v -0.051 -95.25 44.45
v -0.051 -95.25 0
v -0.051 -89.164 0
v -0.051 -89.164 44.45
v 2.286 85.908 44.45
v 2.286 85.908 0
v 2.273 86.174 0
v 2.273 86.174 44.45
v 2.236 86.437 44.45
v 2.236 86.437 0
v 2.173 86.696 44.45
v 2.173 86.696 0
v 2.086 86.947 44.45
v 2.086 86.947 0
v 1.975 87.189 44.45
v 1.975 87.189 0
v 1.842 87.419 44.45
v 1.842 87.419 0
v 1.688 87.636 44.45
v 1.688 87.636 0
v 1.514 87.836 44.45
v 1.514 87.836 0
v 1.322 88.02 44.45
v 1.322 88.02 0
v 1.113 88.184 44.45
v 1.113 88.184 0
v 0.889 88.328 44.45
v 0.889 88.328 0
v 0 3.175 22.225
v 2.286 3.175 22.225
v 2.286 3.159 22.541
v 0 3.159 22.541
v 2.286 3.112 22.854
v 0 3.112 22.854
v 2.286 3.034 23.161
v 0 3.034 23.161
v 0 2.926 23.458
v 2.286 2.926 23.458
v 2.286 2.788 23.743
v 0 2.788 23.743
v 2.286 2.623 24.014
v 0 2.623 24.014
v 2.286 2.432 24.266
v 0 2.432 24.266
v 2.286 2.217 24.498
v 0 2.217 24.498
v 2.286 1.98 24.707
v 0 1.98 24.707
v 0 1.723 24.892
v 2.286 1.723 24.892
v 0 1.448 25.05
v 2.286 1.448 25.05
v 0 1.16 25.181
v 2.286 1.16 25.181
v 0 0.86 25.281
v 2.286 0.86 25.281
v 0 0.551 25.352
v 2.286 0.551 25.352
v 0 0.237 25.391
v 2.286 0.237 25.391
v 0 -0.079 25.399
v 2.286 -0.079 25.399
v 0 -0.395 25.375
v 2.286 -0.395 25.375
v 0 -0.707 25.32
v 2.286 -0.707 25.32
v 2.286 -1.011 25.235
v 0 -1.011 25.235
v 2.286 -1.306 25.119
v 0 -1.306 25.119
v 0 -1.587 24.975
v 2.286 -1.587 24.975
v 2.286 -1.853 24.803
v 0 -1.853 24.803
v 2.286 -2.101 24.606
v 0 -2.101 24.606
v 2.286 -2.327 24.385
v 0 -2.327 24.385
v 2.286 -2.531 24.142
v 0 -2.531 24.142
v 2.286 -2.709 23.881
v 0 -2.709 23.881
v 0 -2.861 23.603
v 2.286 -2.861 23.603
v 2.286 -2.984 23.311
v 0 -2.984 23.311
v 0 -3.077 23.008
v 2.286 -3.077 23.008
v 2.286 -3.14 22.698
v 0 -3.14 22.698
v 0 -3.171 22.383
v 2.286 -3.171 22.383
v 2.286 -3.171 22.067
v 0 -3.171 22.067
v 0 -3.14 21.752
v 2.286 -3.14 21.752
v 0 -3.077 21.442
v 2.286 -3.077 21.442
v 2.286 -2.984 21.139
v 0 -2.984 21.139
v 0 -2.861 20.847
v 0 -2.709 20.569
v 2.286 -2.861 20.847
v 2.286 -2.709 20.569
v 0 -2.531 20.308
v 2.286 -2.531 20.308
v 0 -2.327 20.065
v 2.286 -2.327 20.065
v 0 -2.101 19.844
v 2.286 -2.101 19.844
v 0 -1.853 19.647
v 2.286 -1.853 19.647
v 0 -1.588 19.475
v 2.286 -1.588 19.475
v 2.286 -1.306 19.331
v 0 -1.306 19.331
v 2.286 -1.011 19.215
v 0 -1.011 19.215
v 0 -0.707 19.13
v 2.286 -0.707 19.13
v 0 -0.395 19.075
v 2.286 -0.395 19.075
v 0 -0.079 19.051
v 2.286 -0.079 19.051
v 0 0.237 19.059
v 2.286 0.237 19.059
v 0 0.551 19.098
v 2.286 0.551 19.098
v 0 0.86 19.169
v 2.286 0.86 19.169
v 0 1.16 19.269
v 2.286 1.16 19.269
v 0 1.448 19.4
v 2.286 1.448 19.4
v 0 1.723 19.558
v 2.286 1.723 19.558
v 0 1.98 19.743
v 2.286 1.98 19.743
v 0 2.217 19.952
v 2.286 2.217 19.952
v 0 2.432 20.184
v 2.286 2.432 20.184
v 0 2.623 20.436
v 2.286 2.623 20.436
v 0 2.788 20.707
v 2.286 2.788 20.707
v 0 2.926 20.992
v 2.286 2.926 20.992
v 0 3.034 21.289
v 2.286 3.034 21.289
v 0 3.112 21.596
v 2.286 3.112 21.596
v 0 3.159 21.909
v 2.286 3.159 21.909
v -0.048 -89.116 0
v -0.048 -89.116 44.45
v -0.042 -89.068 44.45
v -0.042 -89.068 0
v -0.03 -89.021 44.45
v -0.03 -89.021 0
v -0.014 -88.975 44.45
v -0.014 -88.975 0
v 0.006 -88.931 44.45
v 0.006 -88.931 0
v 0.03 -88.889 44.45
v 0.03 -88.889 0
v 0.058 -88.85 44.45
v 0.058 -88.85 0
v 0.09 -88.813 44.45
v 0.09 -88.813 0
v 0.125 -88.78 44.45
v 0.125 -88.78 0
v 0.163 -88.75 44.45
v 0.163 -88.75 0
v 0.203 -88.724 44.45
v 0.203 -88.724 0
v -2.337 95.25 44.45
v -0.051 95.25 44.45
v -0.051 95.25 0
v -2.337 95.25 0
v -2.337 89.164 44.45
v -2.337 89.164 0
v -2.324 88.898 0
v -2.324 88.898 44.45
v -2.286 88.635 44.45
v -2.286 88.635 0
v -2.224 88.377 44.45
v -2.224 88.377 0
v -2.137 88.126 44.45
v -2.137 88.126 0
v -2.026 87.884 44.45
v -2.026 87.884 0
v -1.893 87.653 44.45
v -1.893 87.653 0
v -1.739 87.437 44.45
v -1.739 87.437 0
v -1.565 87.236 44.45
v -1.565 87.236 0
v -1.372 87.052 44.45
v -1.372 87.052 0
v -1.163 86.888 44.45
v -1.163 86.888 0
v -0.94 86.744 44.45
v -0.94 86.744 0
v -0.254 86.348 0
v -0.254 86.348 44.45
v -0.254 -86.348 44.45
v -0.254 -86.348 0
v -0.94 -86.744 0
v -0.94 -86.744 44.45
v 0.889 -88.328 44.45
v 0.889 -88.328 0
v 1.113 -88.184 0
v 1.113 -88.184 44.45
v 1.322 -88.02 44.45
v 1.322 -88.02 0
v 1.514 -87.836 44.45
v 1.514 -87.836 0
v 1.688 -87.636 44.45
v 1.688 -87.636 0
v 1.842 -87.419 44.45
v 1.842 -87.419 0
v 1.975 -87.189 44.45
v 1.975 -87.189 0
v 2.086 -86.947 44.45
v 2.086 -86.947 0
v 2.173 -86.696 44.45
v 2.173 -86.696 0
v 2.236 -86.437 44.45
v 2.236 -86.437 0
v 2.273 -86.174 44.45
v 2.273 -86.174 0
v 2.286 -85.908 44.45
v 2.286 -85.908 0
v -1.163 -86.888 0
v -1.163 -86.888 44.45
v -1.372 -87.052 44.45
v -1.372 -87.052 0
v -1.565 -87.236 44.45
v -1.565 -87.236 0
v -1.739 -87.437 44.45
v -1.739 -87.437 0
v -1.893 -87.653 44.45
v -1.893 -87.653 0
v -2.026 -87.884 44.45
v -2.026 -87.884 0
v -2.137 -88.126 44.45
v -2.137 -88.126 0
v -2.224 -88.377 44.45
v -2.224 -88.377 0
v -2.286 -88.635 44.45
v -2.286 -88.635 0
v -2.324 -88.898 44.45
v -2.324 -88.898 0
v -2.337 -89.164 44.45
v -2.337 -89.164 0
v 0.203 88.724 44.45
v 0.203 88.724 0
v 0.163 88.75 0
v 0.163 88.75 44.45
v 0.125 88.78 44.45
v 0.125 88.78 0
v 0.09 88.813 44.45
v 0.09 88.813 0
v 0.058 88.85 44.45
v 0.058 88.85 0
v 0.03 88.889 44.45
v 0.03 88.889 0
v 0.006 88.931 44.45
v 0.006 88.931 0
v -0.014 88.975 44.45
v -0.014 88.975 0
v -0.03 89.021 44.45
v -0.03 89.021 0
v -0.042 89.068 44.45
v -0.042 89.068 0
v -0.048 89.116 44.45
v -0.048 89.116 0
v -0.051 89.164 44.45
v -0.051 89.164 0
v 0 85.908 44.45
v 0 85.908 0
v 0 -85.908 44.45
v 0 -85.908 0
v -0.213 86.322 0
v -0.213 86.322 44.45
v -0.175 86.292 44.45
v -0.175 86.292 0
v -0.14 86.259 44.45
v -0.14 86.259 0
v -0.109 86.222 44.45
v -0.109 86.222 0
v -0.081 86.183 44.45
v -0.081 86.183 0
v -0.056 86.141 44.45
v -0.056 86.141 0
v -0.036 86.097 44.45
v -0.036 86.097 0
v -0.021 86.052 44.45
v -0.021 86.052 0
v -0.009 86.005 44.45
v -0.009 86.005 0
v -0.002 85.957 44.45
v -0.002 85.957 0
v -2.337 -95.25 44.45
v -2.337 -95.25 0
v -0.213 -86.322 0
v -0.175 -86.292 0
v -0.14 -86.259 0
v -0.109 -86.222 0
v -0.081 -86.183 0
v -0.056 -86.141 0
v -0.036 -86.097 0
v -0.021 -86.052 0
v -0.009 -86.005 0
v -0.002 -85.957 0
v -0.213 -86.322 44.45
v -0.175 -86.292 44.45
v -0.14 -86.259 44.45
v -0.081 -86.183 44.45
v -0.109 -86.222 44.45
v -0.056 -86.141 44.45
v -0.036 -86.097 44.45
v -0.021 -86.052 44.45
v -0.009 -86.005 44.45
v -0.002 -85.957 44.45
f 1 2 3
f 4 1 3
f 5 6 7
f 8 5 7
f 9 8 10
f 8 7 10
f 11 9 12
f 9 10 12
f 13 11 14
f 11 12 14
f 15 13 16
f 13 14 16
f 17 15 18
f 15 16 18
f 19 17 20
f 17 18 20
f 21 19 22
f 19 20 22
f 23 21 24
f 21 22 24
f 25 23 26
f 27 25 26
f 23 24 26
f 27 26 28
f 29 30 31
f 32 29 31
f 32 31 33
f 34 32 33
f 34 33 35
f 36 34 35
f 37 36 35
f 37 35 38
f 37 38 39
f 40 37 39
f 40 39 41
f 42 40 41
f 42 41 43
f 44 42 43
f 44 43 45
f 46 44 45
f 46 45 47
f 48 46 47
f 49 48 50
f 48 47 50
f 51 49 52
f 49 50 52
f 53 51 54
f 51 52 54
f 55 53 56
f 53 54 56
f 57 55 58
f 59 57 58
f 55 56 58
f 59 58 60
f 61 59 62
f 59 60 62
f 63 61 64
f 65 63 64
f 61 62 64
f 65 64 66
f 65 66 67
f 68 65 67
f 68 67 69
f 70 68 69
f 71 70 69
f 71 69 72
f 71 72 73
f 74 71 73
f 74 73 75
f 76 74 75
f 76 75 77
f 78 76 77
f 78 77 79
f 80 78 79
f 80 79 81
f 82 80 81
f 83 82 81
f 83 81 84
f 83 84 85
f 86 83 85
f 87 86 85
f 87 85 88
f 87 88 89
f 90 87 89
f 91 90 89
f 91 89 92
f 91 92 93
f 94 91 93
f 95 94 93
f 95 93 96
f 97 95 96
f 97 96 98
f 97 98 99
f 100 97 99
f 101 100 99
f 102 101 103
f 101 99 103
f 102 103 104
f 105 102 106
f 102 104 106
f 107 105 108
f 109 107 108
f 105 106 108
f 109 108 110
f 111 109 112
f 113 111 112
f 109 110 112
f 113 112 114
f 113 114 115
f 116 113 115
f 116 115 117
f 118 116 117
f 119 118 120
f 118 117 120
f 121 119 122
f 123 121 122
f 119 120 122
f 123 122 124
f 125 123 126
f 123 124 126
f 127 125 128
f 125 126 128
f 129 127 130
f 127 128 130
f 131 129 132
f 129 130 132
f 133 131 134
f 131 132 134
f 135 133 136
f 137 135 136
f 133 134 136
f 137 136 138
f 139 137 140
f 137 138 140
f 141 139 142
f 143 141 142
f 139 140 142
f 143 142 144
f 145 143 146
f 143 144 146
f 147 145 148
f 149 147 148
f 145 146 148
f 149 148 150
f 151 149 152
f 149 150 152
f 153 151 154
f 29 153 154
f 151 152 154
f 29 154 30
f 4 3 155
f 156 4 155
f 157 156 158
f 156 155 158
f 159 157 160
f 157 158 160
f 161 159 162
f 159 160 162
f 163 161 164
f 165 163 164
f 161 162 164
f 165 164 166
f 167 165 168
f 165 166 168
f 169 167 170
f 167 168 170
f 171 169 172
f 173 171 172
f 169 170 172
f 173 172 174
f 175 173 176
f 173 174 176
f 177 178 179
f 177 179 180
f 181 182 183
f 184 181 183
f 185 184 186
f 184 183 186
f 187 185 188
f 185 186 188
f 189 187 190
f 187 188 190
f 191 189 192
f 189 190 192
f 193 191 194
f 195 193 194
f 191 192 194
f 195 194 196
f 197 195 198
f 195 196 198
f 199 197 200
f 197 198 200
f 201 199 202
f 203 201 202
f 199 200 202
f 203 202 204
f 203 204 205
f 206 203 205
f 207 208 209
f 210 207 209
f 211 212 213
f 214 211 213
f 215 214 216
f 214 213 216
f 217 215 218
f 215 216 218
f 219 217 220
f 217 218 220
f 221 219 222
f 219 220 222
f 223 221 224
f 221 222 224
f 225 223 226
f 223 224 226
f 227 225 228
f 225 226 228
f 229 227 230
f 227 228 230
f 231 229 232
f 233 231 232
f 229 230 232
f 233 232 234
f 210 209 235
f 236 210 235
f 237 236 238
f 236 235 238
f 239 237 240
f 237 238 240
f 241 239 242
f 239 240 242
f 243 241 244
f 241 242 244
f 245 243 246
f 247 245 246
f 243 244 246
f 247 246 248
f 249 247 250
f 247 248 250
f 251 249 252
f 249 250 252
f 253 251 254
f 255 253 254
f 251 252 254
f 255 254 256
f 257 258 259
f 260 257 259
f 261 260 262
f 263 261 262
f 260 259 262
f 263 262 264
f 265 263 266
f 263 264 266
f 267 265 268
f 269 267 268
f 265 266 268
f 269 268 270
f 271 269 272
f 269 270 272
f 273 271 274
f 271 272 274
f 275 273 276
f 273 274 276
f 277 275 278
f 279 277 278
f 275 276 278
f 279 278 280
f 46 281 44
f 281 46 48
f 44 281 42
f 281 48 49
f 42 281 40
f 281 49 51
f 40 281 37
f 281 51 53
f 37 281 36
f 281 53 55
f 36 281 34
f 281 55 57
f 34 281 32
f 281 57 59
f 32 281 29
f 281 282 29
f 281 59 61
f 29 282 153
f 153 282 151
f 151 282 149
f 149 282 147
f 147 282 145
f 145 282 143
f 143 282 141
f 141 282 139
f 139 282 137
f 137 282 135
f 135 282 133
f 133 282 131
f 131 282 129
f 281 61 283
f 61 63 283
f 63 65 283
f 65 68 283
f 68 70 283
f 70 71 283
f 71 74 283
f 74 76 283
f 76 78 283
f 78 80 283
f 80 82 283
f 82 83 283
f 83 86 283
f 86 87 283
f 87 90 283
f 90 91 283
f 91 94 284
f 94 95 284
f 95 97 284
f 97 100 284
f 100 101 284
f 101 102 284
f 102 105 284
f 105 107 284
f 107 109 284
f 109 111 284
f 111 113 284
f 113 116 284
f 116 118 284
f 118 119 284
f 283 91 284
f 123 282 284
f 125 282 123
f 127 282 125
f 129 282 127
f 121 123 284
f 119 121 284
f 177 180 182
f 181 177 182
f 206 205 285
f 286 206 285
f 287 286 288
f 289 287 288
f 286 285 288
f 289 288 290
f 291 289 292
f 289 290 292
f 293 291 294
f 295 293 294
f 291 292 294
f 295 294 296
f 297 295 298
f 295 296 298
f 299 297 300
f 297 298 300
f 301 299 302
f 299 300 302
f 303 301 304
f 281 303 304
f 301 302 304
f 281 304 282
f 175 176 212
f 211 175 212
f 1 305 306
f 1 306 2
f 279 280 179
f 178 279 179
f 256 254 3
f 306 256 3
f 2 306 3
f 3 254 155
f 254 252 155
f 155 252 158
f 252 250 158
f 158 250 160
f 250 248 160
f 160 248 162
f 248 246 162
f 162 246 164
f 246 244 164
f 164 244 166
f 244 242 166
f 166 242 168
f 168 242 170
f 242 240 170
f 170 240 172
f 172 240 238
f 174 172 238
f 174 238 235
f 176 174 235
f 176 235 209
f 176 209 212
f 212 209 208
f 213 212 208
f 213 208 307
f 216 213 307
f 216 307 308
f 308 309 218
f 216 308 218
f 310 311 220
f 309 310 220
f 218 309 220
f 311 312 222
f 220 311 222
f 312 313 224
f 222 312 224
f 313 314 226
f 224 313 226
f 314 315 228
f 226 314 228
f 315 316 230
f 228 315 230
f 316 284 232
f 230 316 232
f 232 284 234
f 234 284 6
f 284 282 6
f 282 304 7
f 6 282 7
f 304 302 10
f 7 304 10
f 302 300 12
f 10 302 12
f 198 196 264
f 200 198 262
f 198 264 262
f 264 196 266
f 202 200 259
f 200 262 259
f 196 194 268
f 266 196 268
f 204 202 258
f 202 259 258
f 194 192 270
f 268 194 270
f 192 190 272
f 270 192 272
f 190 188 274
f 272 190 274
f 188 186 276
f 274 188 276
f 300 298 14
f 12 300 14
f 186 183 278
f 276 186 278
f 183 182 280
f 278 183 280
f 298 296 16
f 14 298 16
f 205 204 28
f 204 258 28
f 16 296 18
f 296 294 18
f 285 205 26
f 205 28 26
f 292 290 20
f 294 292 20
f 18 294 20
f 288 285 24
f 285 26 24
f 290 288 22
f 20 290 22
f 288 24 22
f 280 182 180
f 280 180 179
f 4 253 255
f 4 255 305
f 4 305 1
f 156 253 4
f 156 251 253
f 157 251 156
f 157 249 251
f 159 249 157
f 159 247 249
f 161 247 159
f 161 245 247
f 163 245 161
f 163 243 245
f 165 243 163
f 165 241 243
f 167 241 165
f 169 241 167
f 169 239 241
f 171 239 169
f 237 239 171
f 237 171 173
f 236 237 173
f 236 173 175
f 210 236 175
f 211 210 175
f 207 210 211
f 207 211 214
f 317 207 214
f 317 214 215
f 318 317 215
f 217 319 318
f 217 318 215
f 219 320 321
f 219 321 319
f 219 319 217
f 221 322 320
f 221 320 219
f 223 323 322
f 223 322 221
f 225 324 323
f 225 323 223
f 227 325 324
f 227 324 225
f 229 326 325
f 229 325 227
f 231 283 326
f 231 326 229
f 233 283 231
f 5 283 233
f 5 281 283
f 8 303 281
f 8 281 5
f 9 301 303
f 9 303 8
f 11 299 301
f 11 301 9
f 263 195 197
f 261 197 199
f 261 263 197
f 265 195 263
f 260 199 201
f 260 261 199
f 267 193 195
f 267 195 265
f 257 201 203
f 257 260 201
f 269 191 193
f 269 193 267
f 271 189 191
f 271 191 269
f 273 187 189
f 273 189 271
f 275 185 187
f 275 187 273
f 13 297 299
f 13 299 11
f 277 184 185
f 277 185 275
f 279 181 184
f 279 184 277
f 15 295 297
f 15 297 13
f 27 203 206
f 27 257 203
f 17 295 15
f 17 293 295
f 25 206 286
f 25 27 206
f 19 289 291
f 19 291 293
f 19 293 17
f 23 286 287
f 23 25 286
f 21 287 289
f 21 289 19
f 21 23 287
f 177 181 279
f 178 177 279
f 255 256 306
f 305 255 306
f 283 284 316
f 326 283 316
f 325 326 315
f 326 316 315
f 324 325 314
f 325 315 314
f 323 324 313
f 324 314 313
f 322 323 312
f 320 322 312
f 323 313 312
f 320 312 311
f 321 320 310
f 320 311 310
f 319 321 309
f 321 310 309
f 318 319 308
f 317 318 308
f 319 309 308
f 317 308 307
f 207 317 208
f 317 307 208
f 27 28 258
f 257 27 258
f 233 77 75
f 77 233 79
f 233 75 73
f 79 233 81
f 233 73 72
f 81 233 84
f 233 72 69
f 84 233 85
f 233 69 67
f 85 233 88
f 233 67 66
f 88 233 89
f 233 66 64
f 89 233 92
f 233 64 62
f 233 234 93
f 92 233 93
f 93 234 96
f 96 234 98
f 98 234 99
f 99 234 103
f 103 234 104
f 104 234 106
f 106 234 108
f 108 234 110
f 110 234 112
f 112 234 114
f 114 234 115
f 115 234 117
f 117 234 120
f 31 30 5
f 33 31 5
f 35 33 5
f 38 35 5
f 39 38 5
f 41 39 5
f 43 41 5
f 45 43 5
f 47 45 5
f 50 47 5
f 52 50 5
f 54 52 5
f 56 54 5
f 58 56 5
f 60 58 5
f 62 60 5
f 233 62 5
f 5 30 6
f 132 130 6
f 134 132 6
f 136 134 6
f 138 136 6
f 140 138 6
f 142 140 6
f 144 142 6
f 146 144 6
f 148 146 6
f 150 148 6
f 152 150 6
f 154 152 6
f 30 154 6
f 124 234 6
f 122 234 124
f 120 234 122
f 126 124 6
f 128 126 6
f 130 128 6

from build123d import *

# Parameters (mm, degrees)
BASE_FLANGE1_DEPTH = 44.45
CUT_EXTRUDE3_REACH = 107.213
SKETCH5_R          = 3.175


# Sheet-metal steps are written as plain solids
with BuildPart() as part:
    # Sketch1 → Base-Flange1 (new body)
    with BuildSketch(Plane.XY):
        with BuildLine():
            Line((-2.3368, 95.25), (-2.3368, 89.163964543))
            ThreePointArc((-2.3368, 89.163964543), (-1.962474978, 87.766964543), (-0.9398, 86.744289565))
            Line((-0.9398, 86.744289565), (-0.254, 86.34834275))
            ThreePointArc((-0.254, 86.34834275), (-0.068059095, 86.162401845), (0, 85.908401845))
            Line((0, 85.908401845), (0, -85.908401845))
            ThreePointArc((0, -85.908401845), (-0.068059095, -86.162401845), (-0.254, -86.34834275))
            Line((-0.254, -86.34834275), (-0.9398, -86.744289565))
            ThreePointArc((-0.9398, -86.744289565), (-1.962474978, -87.766964543), (-2.3368, -89.163964543))
            Line((-2.3368, -89.163964543), (-2.3368, -95.25))
            Line((-2.3368, -95.25), (-0.0508, -95.25))
            Line((-0.0508, -95.25), (-0.0508, -89.163964543))
            ThreePointArc((-0.0508, -89.163964543), (0.017259095, -88.909964543), (0.2032, -88.724023638))
            Line((0.2032, -88.724023638), (0.889, -88.328076823))
            ThreePointArc((0.889, -88.328076823), (1.911674978, -87.305401845), (2.286, -85.908401845))
            Line((2.286, -85.908401845), (2.286, 85.908401845))
            ThreePointArc((2.286, 85.908401845), (1.911674978, 87.305401845), (0.889, 88.328076823))
            Line((0.889, 88.328076823), (0.2032, 88.724023638))
            ThreePointArc((0.2032, 88.724023638), (0.017259095, 88.909964543), (-0.0508, 89.163964543))
            Line((-0.0508, 89.163964543), (-0.0508, 95.25))
            Line((-0.0508, 95.25), (-2.3368, 95.25))
        make_face()
    extrude(amount=BASE_FLANGE1_DEPTH)

    # Sketch5 → Cut-Extrude3 (cut, up to next)
    with BuildSketch(Plane(origin=(2.286, 0, 0), x_dir=(0, 0, -1), z_dir=(1, 0, 0)), mode=Mode.PRIVATE) as cut_extrude3_sk1:
        with Locations(Location((-22.225, 0, 0), (0, 0, 90))):
            Circle(SKETCH5_R)
    cut_extrude3_tool1 = extrude(cut_extrude3_sk1.sketch, amount=-CUT_EXTRUDE3_REACH, mode=Mode.PRIVATE) & part.part
    add(cut_extrude3_tool1.solids().sort_by_distance((2.286, 0, 22.225))[0], mode=Mode.SUBTRACT)


solid = part.part
